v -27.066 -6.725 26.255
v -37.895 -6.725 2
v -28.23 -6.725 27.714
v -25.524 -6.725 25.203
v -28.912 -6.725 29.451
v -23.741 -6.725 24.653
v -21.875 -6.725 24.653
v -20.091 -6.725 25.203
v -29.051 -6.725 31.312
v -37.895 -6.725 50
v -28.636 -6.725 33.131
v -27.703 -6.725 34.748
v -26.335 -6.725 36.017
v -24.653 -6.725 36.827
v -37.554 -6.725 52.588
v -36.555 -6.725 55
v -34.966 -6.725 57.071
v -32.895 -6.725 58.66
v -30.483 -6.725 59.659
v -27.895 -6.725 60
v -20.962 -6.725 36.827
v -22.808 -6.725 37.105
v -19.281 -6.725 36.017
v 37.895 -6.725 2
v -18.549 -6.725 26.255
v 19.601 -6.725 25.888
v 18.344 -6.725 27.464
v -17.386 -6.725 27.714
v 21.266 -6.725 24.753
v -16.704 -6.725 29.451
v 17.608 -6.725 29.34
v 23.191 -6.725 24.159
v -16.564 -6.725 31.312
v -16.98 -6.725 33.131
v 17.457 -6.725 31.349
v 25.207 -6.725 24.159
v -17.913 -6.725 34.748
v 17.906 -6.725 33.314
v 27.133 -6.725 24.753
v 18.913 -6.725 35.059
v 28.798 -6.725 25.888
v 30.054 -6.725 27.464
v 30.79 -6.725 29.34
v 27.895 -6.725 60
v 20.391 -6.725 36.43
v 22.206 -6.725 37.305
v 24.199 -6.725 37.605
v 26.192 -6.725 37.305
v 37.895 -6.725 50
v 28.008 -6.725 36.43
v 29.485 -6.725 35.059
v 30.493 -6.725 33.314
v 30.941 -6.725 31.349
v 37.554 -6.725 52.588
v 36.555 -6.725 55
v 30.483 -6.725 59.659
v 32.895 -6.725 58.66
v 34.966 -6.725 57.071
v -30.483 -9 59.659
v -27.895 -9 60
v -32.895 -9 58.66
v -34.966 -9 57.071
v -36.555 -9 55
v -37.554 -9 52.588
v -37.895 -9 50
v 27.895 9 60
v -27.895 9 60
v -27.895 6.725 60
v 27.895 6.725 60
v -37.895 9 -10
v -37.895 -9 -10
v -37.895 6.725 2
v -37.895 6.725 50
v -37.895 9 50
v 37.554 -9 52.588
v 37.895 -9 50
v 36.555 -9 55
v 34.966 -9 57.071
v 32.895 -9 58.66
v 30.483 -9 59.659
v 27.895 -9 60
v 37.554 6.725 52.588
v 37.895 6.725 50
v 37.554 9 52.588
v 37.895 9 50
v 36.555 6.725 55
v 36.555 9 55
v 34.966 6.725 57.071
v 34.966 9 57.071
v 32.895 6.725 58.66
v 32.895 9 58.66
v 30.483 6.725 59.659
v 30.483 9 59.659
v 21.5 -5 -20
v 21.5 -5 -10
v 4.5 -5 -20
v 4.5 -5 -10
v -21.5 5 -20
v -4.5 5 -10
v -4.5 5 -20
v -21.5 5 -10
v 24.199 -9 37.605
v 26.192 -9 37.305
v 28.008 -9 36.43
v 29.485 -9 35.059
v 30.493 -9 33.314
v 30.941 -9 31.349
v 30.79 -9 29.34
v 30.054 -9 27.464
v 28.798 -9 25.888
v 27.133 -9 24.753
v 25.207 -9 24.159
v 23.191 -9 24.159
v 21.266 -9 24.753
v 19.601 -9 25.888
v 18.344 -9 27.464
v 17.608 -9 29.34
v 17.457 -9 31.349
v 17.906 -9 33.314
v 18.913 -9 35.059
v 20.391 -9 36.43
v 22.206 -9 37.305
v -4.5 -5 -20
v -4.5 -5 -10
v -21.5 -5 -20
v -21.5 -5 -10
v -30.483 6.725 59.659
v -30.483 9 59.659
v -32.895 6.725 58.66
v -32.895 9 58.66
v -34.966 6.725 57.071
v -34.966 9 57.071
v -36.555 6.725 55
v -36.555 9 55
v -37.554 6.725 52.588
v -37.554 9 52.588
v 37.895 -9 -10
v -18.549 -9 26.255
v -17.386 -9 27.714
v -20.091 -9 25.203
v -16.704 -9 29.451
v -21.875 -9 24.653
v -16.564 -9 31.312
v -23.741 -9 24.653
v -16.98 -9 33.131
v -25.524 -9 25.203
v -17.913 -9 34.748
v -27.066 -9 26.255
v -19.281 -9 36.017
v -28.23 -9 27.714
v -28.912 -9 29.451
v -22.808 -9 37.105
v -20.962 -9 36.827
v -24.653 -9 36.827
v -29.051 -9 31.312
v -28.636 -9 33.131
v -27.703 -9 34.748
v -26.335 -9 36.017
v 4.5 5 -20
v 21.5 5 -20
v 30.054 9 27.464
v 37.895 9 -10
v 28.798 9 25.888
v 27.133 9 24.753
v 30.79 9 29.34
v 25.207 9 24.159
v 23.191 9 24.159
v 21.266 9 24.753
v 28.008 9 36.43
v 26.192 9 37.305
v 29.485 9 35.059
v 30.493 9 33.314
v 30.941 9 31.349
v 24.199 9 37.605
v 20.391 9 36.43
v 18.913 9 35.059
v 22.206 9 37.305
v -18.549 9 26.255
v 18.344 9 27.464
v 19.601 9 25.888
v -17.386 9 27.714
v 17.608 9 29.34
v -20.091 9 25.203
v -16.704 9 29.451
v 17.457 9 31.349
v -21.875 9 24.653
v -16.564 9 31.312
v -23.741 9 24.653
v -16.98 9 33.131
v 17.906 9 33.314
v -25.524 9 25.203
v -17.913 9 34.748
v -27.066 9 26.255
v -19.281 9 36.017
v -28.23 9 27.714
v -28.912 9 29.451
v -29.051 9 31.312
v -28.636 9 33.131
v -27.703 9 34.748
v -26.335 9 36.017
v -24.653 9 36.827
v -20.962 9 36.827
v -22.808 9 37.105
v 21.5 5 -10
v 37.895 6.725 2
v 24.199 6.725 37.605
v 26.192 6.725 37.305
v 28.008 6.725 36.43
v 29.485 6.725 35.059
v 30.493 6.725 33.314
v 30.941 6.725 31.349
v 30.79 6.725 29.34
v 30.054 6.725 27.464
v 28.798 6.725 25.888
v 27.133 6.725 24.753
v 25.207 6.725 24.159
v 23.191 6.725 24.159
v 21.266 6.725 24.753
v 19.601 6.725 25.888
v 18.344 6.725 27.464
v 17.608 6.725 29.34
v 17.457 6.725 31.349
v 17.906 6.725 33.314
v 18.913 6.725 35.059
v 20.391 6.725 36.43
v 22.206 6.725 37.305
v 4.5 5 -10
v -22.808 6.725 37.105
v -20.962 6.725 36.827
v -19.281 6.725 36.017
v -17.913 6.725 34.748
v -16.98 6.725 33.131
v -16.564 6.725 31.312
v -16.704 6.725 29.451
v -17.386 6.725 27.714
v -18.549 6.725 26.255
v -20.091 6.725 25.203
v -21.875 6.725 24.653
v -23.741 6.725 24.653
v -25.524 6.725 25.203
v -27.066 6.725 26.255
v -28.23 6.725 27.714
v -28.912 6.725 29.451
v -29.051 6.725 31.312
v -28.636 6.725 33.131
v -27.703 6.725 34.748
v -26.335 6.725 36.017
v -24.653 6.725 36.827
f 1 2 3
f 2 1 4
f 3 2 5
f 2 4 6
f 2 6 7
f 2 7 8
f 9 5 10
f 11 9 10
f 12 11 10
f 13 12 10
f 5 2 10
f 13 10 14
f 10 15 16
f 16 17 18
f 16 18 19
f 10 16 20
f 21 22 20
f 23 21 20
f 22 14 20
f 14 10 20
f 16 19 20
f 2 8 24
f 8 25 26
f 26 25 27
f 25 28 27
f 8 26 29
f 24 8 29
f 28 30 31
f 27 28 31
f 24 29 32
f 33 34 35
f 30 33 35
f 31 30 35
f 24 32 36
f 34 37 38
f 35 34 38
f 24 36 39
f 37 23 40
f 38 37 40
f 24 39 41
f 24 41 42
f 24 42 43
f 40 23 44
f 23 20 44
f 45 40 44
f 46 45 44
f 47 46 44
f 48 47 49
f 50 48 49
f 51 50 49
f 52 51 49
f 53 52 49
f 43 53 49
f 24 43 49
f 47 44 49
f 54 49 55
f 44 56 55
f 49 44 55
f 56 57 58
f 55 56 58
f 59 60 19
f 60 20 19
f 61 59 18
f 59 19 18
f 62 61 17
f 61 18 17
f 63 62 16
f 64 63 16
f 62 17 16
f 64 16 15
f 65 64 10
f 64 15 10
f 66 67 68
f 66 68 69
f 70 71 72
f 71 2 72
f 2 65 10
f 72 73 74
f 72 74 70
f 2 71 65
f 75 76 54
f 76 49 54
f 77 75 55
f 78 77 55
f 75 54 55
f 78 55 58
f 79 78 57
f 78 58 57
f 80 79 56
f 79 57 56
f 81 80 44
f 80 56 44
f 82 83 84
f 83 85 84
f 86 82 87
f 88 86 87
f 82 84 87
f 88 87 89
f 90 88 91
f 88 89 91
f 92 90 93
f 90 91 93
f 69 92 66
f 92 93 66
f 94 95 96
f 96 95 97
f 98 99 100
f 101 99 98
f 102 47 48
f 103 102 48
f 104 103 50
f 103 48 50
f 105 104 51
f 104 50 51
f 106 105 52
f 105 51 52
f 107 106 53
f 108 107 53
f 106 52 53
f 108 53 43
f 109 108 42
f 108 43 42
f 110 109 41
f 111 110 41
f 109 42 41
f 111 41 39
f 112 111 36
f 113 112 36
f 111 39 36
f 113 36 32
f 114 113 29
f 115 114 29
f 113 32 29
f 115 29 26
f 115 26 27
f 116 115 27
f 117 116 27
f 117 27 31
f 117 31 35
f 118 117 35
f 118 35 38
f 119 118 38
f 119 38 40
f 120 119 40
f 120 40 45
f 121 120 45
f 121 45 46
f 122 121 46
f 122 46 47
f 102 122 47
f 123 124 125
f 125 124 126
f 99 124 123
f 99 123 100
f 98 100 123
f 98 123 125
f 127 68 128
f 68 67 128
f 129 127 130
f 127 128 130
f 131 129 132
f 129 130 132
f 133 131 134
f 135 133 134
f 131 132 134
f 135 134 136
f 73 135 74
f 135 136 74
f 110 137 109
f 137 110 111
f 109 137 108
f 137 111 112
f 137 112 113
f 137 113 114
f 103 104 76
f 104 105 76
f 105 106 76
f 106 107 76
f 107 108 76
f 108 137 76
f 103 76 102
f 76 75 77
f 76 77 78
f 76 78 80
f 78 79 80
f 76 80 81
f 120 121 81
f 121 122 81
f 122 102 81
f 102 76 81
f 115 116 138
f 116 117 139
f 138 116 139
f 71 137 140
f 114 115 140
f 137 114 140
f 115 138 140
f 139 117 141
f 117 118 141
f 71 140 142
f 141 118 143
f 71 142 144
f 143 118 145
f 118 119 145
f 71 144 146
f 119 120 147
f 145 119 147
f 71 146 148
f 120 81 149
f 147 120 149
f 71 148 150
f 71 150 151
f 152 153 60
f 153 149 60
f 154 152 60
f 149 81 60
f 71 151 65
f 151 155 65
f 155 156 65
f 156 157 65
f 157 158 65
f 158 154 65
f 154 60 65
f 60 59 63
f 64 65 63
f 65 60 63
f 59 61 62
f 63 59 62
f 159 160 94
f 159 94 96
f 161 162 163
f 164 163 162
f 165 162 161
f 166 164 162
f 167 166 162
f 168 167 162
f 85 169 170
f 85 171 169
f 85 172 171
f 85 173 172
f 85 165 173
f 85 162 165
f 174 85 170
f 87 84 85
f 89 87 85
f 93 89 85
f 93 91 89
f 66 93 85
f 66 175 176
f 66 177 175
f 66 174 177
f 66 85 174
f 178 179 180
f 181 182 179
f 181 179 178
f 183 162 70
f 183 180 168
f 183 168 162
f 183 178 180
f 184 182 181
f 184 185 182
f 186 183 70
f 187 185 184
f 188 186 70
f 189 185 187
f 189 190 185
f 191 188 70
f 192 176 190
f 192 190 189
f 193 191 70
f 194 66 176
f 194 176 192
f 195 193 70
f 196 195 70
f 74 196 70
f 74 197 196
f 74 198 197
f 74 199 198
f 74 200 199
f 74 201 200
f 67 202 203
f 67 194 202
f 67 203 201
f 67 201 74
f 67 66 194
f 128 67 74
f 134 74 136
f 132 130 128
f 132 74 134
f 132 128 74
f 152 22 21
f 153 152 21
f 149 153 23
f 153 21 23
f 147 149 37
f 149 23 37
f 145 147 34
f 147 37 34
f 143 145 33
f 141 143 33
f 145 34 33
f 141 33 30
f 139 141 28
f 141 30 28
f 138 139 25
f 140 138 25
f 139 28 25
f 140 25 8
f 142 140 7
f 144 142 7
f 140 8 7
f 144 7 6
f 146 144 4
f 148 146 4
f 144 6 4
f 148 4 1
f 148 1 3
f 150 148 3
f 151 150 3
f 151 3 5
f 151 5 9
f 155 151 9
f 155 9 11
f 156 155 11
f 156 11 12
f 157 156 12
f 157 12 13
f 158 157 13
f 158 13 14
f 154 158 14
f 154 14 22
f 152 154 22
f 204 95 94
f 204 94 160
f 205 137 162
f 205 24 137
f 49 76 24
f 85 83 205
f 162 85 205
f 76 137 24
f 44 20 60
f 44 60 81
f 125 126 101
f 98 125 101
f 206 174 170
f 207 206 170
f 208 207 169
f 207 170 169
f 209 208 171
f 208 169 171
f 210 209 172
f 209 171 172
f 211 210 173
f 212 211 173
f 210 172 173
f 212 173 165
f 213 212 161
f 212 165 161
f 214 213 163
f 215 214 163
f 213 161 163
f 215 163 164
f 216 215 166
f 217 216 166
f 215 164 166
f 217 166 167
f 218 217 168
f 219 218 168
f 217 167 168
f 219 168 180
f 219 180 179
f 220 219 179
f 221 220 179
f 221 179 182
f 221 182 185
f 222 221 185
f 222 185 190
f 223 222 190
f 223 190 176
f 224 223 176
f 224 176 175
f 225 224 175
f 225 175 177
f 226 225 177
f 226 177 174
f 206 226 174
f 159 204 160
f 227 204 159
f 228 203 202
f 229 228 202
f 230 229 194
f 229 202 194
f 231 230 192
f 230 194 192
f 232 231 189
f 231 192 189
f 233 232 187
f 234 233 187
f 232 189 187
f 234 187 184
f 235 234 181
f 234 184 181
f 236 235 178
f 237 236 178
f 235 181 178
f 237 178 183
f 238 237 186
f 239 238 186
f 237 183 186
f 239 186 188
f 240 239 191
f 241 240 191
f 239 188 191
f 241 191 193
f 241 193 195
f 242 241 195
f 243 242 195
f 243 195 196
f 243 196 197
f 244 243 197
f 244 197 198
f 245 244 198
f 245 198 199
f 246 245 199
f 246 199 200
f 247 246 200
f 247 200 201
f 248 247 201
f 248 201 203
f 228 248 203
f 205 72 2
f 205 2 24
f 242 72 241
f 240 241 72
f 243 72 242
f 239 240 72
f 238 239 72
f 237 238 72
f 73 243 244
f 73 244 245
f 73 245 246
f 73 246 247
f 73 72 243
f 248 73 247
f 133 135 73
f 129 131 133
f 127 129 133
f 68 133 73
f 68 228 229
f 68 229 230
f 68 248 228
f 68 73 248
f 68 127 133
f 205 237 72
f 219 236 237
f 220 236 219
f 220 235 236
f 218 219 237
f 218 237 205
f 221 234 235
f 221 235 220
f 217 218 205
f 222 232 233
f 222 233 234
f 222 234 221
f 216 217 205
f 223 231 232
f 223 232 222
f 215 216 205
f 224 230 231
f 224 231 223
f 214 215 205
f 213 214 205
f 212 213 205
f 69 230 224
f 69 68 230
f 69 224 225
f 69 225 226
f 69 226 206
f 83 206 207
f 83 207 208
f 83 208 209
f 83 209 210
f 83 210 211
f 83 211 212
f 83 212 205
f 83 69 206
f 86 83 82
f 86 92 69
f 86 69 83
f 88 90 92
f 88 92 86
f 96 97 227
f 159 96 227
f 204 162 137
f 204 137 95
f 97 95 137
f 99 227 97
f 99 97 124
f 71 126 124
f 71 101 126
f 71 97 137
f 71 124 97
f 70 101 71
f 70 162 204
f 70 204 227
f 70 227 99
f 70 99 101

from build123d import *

# Parameters (mm, degrees)
SKETCH1_W           = 75.79
SKETCH1_H           = 18
BOSS_EXTRUDE1_DEPTH = 60
SKETCH2_W           = 75.79
SKETCH2_H           = 13.45
CUT_EXTRUDE1_DEPTH  = 58
SKETCH7_R           = 6.260869565
SKETCH7_R_2         = 6.760869565
CUT_EXTRUDE3_DEPTH  = 74.212232755
SKETCH6_W           = 75.79
SKETCH6_H           = 18
BOSS_EXTRUDE2_DEPTH = 10
SKETCH8_W           = 17
SKETCH8_H           = 10
BOSS_EXTRUDE3_DEPTH = 10
FILLET1_R           = 10


with BuildPart() as part:
    # Sketch1 → Boss-Extrude1 (new body)
    with BuildSketch(Plane.XY):
        Rectangle(SKETCH1_W, SKETCH1_H)
    extrude(amount=BOSS_EXTRUDE1_DEPTH)

    # Sketch2 → Cut-Extrude1 (cut)
    with BuildSketch(Plane.XY.offset(60)):
        Rectangle(SKETCH2_W, SKETCH2_H)
    extrude(amount=-CUT_EXTRUDE1_DEPTH, mode=Mode.SUBTRACT)

    # Sketch7 → Cut-Extrude3 (cut, through all)
    with BuildSketch(Plane(origin=(0, 9, 0), x_dir=(1, 0, 0), z_dir=(0, 1, 0))):
        with Locations(Location((-22.807801707, -30.844118328, 0), (0, 0, 270))):
            Circle(SKETCH7_R)
        with Locations(Location((24.199095104, -30.844118328, 0), (0, 0, 270))):
            Circle(SKETCH7_R_2)
    extrude(amount=-CUT_EXTRUDE3_DEPTH, mode=Mode.SUBTRACT)

    # Sketch6 → Boss-Extrude2 (add)
    with BuildSketch(Plane(origin=(0, 0, 0), x_dir=(-1, 0, 0), z_dir=(0, 0, -1))):
        Rectangle(SKETCH6_W, SKETCH6_H)
    extrude(amount=BOSS_EXTRUDE2_DEPTH)

    # Sketch8 → Boss-Extrude3 (add)
    with BuildSketch(Plane(origin=(0, 0, -10), x_dir=(-1, 0, 0), z_dir=(0, 0, -1))):
        with Locations((-13, 0)):
            Rectangle(SKETCH8_W, SKETCH8_H)
        with Locations((13, 0)):
            Rectangle(SKETCH8_W, SKETCH8_H)
    extrude(amount=BOSS_EXTRUDE3_DEPTH)

    # Fillet1
    fillet1_edges = [part.edges().sort_by_distance(p)[0] for p in [
        (-37.895, 7.8625, 60),
        (37.895, 7.8625, 60),
        (-37.895, -7.8625, 60),
        (37.895, -7.8625, 60),
    ]]
    fillet(fillet1_edges, radius=FILLET1_R)


solid = part.part
